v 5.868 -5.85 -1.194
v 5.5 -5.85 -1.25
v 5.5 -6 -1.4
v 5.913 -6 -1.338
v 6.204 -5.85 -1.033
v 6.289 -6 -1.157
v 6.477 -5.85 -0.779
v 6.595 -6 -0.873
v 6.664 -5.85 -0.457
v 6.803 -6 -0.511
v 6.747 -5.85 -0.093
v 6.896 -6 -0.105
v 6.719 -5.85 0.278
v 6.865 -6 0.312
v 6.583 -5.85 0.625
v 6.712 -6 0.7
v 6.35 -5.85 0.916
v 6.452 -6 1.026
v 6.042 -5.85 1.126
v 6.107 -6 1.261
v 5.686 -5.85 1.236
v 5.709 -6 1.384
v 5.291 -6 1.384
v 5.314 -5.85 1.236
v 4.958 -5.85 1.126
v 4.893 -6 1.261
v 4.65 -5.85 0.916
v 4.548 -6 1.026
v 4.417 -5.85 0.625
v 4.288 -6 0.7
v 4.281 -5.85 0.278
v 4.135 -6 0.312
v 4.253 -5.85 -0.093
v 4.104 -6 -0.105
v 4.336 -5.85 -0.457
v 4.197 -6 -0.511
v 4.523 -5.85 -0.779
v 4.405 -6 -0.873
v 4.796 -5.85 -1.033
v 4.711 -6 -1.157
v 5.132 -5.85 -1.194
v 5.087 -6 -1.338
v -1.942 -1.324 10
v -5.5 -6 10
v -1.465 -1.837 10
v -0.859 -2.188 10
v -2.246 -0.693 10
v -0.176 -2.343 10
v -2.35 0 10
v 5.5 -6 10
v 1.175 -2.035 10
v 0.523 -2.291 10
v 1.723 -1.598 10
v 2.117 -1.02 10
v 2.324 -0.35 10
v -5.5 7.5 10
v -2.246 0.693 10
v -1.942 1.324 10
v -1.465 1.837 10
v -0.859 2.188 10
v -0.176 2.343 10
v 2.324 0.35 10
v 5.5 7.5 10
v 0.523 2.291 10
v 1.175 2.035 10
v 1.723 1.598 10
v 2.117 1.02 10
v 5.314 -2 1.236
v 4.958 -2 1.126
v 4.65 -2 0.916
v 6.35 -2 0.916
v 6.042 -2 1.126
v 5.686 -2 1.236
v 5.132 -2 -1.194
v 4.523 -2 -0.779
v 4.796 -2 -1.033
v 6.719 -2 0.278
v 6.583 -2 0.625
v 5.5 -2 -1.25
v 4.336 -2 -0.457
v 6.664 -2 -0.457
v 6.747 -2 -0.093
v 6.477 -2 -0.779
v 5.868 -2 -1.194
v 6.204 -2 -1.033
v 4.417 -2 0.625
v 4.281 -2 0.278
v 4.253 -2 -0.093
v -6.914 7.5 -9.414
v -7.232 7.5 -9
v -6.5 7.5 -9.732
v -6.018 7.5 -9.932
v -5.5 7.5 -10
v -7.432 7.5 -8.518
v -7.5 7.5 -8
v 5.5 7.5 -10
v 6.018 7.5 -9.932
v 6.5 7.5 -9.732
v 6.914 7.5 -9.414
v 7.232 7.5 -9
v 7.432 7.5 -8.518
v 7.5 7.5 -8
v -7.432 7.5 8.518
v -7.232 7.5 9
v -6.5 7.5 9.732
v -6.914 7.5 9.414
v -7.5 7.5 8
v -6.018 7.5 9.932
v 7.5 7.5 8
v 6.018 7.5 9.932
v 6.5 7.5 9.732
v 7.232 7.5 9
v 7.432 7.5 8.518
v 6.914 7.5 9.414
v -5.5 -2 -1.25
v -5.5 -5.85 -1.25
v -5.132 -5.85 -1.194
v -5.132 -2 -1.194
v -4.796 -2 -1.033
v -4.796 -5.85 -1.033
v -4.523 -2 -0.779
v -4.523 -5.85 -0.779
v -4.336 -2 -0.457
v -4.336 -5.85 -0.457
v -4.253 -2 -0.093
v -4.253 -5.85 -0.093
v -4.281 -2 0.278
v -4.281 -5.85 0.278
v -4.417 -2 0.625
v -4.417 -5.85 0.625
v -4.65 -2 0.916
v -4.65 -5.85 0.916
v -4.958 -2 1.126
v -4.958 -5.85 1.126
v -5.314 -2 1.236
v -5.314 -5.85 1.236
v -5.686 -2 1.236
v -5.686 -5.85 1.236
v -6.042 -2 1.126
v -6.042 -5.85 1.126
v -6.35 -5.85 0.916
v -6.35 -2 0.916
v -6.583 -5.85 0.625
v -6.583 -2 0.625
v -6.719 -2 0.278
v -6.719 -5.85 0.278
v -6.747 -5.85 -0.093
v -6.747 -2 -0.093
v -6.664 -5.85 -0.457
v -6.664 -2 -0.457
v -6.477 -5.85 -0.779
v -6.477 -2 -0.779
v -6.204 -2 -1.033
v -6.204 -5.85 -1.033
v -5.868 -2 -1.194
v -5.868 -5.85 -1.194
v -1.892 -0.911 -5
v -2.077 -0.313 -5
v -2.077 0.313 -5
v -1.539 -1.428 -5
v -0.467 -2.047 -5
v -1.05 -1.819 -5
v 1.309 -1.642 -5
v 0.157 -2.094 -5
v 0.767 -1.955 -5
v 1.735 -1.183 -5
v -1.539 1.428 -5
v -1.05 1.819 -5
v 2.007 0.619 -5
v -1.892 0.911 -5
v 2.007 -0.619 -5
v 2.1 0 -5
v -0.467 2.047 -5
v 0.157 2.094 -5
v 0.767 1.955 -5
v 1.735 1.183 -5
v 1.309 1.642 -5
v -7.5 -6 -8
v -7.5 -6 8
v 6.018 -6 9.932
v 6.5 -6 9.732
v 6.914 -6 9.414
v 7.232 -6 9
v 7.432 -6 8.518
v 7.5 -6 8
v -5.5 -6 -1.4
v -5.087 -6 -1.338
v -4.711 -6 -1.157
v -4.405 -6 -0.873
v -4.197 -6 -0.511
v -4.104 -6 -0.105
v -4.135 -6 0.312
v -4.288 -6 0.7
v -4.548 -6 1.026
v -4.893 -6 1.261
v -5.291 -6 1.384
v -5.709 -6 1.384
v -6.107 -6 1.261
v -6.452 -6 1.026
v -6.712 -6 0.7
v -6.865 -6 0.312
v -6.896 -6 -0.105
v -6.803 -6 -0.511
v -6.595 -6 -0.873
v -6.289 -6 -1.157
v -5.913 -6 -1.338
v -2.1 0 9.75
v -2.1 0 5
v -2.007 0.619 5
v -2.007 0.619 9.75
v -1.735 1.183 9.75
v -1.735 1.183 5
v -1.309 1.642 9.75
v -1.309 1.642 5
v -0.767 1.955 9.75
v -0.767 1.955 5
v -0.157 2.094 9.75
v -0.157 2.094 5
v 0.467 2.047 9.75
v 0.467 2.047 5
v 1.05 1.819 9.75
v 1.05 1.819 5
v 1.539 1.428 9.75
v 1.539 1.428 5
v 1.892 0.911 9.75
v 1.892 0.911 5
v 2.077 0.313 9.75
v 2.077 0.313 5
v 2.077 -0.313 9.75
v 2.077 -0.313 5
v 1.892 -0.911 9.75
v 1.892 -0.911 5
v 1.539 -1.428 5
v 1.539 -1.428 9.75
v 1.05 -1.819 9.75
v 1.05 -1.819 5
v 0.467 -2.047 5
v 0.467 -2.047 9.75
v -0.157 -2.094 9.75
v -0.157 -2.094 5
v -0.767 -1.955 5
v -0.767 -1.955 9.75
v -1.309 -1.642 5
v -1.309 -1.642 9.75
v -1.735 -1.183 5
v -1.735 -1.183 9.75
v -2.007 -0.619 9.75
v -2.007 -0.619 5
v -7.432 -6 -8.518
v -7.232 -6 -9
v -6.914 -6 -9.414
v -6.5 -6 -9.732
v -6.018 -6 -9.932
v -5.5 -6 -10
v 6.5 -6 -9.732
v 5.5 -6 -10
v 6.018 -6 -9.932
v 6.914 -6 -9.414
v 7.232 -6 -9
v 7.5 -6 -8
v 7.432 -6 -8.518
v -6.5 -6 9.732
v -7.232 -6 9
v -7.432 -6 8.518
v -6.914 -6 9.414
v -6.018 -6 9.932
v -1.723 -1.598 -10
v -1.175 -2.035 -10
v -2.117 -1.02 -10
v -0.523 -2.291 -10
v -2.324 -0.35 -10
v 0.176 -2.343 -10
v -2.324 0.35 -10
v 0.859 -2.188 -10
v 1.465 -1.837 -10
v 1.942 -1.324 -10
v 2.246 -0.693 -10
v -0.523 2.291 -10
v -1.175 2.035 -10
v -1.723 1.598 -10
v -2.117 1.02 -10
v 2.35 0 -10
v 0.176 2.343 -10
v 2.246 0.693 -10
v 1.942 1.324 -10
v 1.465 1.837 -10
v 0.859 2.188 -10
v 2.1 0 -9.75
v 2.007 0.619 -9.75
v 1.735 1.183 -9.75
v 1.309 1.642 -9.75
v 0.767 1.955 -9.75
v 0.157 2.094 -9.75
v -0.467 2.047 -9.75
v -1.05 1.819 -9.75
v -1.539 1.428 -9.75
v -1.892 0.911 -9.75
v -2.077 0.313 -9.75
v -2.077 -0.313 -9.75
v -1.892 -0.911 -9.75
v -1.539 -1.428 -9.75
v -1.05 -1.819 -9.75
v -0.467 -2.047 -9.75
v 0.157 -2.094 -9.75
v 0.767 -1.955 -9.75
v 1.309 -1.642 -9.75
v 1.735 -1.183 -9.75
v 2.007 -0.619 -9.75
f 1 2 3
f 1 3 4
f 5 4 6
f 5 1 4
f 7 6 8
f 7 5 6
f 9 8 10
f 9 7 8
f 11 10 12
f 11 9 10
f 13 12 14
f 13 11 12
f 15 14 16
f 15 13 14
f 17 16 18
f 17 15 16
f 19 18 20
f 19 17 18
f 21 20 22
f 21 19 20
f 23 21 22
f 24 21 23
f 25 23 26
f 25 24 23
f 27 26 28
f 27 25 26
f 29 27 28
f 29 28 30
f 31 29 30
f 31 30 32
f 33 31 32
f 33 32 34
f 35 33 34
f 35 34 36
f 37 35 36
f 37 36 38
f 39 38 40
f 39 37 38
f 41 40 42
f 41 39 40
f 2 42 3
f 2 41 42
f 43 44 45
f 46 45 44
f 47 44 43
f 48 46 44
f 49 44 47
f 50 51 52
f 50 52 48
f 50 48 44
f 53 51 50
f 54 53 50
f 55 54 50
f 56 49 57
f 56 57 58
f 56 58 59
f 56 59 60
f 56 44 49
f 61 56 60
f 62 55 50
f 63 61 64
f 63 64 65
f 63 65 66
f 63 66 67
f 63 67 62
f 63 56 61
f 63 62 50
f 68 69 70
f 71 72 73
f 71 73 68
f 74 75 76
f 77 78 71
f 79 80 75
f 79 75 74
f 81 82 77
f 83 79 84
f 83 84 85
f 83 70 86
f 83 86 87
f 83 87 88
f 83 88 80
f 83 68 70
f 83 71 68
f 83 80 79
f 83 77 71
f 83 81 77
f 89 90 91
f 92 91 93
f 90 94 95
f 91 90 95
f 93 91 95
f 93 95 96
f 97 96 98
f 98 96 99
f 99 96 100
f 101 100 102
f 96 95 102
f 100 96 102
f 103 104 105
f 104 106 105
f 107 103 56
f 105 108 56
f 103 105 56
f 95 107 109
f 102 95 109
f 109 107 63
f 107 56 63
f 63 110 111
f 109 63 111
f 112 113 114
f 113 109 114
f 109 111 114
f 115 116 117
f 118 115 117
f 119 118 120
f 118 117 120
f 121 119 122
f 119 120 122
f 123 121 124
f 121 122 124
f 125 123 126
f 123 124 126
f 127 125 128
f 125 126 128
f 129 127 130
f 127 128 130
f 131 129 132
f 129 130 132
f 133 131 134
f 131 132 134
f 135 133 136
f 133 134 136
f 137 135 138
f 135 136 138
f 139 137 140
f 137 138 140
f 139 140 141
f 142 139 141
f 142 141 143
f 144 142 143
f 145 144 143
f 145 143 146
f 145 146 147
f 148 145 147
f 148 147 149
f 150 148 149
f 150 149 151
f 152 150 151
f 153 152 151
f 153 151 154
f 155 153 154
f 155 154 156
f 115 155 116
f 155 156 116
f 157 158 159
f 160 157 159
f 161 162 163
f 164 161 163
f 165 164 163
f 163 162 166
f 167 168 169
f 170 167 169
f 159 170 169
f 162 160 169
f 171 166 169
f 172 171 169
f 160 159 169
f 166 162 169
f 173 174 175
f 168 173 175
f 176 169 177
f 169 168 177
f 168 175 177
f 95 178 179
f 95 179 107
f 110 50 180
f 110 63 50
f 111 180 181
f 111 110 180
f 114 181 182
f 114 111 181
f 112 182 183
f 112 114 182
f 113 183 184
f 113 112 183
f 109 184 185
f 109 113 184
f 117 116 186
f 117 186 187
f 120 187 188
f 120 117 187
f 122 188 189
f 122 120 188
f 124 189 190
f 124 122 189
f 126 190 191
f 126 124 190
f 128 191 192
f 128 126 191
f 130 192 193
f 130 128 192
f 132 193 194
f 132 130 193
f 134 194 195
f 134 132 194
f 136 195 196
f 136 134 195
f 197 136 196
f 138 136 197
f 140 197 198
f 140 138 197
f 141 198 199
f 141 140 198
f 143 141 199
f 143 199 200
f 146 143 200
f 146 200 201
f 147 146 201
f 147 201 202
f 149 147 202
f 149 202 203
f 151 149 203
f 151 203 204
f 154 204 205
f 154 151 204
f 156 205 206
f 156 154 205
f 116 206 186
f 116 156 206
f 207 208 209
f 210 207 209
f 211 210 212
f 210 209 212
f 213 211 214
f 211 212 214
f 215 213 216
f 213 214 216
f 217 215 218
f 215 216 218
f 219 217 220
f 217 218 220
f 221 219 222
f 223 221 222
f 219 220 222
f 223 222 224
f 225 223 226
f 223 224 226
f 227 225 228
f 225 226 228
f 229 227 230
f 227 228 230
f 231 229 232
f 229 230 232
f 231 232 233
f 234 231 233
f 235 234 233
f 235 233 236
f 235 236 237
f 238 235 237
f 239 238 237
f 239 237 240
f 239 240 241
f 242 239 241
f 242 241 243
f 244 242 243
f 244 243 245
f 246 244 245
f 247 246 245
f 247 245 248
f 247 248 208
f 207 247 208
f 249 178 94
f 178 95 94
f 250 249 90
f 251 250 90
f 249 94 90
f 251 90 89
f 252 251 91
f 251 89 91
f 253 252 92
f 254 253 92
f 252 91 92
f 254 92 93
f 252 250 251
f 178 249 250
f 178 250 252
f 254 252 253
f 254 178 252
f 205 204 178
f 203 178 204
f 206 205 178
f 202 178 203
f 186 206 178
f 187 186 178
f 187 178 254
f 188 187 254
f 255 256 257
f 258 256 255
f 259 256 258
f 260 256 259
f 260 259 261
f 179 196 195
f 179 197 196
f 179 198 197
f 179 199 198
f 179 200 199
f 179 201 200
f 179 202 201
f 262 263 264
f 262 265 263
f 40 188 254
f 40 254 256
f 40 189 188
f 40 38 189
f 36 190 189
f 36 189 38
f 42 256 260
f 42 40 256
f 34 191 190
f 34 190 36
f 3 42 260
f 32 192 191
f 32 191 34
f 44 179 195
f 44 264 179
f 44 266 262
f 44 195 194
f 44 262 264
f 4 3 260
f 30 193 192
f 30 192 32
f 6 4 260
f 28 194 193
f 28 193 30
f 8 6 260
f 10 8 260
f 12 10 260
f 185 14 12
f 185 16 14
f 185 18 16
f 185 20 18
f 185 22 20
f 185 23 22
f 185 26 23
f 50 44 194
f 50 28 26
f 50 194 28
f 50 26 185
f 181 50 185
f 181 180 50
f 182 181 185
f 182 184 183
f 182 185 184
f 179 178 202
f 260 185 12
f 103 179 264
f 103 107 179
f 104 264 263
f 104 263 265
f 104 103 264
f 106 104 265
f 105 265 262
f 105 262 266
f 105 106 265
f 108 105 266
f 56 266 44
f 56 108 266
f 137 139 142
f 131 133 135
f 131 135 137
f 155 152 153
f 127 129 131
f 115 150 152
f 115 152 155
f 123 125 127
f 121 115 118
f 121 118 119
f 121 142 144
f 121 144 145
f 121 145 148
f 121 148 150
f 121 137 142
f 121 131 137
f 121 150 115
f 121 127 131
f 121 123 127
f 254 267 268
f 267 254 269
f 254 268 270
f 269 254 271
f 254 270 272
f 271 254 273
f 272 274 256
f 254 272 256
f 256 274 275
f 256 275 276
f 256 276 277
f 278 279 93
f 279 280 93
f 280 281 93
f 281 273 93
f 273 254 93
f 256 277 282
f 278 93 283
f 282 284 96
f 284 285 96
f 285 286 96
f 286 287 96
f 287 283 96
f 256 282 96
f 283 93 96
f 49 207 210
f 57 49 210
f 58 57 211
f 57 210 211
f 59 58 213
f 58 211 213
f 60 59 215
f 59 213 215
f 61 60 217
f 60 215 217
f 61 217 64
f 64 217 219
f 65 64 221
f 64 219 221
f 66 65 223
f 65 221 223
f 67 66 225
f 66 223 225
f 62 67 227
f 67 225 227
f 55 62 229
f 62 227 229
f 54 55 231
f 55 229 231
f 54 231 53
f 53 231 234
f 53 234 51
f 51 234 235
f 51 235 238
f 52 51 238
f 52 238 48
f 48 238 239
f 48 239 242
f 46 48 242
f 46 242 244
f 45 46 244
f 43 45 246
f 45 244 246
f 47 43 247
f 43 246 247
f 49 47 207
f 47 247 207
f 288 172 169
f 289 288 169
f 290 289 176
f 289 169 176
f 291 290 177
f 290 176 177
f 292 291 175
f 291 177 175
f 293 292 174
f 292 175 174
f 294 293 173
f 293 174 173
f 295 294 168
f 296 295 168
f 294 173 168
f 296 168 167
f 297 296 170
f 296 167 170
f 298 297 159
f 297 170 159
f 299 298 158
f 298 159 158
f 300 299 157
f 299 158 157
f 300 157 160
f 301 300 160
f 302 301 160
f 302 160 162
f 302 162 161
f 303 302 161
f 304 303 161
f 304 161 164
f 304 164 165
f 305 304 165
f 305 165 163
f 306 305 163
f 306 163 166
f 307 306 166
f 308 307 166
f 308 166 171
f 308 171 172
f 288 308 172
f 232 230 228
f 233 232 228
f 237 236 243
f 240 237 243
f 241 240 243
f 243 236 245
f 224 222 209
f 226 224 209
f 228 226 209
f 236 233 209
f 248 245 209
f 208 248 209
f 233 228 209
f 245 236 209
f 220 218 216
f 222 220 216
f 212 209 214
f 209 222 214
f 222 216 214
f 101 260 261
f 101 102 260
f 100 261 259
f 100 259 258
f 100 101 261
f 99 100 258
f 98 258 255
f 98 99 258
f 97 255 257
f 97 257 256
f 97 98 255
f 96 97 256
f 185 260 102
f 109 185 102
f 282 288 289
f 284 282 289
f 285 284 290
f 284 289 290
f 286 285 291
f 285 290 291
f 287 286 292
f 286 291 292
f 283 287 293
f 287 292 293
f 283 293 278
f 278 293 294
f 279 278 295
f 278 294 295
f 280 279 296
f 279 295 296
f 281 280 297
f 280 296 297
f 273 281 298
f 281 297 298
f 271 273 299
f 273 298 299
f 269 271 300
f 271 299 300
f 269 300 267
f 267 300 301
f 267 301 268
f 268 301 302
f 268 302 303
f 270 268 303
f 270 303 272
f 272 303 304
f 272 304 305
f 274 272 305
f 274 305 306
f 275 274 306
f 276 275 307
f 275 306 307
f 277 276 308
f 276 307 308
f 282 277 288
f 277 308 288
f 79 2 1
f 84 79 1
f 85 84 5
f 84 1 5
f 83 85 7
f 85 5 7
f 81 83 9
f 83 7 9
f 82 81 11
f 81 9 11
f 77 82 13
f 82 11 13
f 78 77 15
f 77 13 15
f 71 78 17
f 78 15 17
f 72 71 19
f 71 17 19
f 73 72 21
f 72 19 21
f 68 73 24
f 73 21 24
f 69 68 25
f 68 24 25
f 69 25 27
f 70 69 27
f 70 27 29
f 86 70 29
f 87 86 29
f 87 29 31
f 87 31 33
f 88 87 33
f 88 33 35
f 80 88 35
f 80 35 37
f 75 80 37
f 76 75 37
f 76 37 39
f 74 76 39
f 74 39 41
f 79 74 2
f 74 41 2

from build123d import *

# Parameters (mm, degrees)
SKETCH1_W                = 15
SKETCH1_H                = 13.5
BOSS_EXTRUDE1_DEPTH      = 10
FILLET1_R                = 2
M5_PORTS_D               = 4.2
M5_PORTS_DEPTH           = 5
M5_PORTS_ON_FACE_2_D     = 4.2
M5_PORTS_ON_FACE_2_DEPTH = 5
M5_PORT_CHAMFER_SIZE     = 0.25
SKETCH3_R                = 1.25
CUT_EXTRUDE1_DEPTH       = 4
CHAMFER2_SIZE            = 0.15


with BuildPart() as part:
    # Sketch1 → Boss-Extrude1 (new, symmetric)
    with BuildSketch(Plane.XY):
        with Locations((0, 0.75)):
            Rectangle(SKETCH1_W, SKETCH1_H)
    extrude(amount=BOSS_EXTRUDE1_DEPTH, both=True)

    # Fillet1
    fillet1_edges = [part.edges().sort_by_distance(p)[0] for p in [
        (-7.5, 0.75, -10),
        (7.5, 0.75, -10),
        (7.5, 0.75, 10),
        (-7.5, 0.75, 10),
    ]]
    fillet(fillet1_edges, radius=FILLET1_R)

    # M5 Ports
    with Locations(Plane.XY.offset(10)):
        with Locations((0, 0)):
            Hole(M5_PORTS_D / 2, depth=M5_PORTS_DEPTH)

    # M5 Ports on face 2
    with Locations(Plane(origin=(0, 0, -10), x_dir=(-1, 0, 0), z_dir=(0, 0, -1))):
        with Locations((0, 0)):
            Hole(M5_PORTS_ON_FACE_2_D / 2, depth=M5_PORTS_ON_FACE_2_DEPTH)

    # M5 Port Chamfer
    m5_port_chamfer_edges = [part.edges().sort_by_distance(p)[0] for p in [
        (-2.1, 0, -10),
        (2.1, 0, 10),
    ]]
    chamfer(m5_port_chamfer_edges, length=M5_PORT_CHAMFER_SIZE)

    # Sketch3 → Cut-Extrude1 (cut)
    with BuildSketch(Plane.XZ.offset(6)):
        with Locations((-5.5, 0)):
            Circle(SKETCH3_R)
        with Locations((5.5, 0)):
            Circle(SKETCH3_R)
    extrude(amount=-CUT_EXTRUDE1_DEPTH, mode=Mode.SUBTRACT)

    # Chamfer2
    chamfer2_edges = [part.edges().sort_by_distance(p)[0] for p in [
        (4.25, -6, 0),
        (-6.75, -6, 0),
    ]]
    chamfer(chamfer2_edges, length=CHAMFER2_SIZE)


solid = part.part
